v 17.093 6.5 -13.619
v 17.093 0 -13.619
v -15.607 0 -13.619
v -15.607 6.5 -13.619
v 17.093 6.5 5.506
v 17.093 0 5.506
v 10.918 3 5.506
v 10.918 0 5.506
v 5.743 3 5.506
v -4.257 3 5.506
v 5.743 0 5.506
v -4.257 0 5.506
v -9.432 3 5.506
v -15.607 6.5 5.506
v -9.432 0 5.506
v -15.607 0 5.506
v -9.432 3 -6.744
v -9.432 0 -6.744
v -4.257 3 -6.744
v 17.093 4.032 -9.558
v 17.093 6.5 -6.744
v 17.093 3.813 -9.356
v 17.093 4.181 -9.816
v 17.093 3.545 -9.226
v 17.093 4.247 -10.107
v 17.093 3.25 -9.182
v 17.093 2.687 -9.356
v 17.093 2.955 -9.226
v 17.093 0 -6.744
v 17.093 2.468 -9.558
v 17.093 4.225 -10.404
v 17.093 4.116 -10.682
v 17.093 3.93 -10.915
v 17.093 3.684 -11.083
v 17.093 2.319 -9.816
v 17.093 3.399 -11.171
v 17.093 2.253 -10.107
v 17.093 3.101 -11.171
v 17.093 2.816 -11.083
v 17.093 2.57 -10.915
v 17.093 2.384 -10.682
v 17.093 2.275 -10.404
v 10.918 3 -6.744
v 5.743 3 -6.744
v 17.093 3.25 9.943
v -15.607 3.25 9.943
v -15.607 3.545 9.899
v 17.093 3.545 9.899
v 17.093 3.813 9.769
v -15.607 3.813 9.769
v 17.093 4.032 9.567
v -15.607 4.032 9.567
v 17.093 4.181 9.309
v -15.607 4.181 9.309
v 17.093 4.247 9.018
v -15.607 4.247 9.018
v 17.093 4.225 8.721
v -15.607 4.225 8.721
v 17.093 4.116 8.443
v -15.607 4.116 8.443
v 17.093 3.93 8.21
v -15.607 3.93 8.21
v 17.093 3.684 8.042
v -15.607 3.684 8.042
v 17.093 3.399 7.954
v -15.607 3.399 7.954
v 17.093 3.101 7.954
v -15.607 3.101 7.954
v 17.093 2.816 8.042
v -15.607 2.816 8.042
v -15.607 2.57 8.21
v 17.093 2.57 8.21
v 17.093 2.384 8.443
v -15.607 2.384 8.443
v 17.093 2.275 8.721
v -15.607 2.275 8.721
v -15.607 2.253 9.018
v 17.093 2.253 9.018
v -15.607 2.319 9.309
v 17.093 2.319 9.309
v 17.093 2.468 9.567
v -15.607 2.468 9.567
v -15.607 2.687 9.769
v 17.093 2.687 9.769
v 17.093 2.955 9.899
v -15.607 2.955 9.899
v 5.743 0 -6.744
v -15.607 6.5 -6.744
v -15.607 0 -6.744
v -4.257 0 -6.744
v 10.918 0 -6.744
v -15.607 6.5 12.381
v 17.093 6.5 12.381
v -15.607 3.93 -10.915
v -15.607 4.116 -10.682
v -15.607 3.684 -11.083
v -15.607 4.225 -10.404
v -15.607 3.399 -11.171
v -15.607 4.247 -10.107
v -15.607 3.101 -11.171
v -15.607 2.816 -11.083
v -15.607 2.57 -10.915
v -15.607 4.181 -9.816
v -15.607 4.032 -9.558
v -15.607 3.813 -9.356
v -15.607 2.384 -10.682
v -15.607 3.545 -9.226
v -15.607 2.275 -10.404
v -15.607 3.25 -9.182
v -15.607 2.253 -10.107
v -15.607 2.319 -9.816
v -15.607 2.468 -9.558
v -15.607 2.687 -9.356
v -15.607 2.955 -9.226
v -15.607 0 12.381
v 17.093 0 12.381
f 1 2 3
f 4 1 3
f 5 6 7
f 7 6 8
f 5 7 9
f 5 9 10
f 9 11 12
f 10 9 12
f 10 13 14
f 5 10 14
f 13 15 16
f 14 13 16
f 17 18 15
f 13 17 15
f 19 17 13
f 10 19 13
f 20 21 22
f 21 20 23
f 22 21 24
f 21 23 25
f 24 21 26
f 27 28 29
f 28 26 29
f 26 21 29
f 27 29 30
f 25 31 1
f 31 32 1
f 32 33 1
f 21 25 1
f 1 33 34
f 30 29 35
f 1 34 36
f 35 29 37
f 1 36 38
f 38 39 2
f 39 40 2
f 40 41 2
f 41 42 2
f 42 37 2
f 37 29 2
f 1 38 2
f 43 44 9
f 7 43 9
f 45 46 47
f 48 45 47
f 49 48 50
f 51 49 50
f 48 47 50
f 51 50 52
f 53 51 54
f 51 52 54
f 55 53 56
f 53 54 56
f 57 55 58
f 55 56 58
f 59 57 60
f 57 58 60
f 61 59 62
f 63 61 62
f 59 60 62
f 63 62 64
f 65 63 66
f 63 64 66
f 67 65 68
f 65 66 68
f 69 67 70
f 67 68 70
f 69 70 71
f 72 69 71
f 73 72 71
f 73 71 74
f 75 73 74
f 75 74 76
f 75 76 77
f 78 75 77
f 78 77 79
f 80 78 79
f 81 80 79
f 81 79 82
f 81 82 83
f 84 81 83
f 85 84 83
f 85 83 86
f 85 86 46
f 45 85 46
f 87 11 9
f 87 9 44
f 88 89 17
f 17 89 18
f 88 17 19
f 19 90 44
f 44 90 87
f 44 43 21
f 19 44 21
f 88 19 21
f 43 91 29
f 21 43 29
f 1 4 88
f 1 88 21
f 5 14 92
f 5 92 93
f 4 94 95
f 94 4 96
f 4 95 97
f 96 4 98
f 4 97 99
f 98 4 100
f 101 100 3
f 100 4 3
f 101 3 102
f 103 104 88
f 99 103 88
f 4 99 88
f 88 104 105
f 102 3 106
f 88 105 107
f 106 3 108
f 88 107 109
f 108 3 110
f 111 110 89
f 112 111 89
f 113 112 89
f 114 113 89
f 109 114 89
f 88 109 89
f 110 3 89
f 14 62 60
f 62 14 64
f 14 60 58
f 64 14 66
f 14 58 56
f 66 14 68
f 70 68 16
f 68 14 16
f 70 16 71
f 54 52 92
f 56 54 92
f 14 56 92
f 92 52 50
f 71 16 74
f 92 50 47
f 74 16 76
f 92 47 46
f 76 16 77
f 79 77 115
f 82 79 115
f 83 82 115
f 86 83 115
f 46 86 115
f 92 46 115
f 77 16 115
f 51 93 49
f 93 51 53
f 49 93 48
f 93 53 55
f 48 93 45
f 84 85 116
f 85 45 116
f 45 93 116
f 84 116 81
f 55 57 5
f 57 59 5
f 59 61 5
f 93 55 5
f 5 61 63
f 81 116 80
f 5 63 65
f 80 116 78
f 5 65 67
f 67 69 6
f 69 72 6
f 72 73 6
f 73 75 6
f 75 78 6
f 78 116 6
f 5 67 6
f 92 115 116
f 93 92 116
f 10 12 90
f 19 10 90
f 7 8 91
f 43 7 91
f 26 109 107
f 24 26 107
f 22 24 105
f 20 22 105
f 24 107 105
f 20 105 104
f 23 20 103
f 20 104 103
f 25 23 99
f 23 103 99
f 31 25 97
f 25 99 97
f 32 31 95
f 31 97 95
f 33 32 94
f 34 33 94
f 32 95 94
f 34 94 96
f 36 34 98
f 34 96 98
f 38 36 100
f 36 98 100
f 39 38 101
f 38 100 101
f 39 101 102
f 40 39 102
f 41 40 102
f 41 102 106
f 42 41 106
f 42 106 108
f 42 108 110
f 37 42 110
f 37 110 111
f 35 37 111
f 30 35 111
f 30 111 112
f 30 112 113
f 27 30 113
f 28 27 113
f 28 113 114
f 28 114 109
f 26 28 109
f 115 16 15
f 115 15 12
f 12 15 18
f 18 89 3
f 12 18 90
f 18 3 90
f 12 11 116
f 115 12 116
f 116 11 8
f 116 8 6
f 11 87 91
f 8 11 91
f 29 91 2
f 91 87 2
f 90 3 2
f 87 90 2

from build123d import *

# Parameters (mm, degrees)
CROQUIS1_W              = 10
CROQUIS1_H              = 12.25
SALIENTE_EXTRUIR1_DEPTH = 6.5
CROQUIS3_R              = 1
CROQUIS3_W              = 12.25
CROQUIS3_H              = 3.5
CORTAR_EXTRUIR1_DEPTH   = 35.4


with BuildPart() as part:
    # Croquis1 → Saliente-Extruir1 (new body)
    with BuildSketch(Plane(origin=(0, 0, 0), x_dir=(1, 0, 0), z_dir=(0, 1, 0))):
        Polygon((-15.606807411, 13.619327476), (-15.606807411, 6.744327476), (-9.43180722, 6.744327476), (-9.43180722, -5.505672524), (-15.606807411, -5.505672524), (-15.606807411, -12.380672524), (17.093193352, -12.380672524), (17.093193352, -5.505672524), (10.918193161, -5.505672524), (10.918193161, 6.744327476), (17.093193352, 6.744327476), (17.093193352, 13.619327476), align=None)
        with Locations((0.743192971, 0.619327476)):
            Rectangle(CROQUIS1_W, CROQUIS1_H, mode=Mode.SUBTRACT)
    extrude(amount=SALIENTE_EXTRUIR1_DEPTH)

    # Croquis3 → Cortar-Extruir1 (cut)
    with BuildSketch(Plane.ZY.offset(15.606807411)):
        with Locations((-10.181827476, 3.25)):
            Circle(CROQUIS3_R)
        with Locations((8.943172524, 3.25)):
            Circle(CROQUIS3_R)
        with Locations((-0.619327476, 4.75)):
            Rectangle(CROQUIS3_W, CROQUIS3_H)
    extrude(amount=-CORTAR_EXTRUIR1_DEPTH, mode=Mode.SUBTRACT)


solid = part.part
